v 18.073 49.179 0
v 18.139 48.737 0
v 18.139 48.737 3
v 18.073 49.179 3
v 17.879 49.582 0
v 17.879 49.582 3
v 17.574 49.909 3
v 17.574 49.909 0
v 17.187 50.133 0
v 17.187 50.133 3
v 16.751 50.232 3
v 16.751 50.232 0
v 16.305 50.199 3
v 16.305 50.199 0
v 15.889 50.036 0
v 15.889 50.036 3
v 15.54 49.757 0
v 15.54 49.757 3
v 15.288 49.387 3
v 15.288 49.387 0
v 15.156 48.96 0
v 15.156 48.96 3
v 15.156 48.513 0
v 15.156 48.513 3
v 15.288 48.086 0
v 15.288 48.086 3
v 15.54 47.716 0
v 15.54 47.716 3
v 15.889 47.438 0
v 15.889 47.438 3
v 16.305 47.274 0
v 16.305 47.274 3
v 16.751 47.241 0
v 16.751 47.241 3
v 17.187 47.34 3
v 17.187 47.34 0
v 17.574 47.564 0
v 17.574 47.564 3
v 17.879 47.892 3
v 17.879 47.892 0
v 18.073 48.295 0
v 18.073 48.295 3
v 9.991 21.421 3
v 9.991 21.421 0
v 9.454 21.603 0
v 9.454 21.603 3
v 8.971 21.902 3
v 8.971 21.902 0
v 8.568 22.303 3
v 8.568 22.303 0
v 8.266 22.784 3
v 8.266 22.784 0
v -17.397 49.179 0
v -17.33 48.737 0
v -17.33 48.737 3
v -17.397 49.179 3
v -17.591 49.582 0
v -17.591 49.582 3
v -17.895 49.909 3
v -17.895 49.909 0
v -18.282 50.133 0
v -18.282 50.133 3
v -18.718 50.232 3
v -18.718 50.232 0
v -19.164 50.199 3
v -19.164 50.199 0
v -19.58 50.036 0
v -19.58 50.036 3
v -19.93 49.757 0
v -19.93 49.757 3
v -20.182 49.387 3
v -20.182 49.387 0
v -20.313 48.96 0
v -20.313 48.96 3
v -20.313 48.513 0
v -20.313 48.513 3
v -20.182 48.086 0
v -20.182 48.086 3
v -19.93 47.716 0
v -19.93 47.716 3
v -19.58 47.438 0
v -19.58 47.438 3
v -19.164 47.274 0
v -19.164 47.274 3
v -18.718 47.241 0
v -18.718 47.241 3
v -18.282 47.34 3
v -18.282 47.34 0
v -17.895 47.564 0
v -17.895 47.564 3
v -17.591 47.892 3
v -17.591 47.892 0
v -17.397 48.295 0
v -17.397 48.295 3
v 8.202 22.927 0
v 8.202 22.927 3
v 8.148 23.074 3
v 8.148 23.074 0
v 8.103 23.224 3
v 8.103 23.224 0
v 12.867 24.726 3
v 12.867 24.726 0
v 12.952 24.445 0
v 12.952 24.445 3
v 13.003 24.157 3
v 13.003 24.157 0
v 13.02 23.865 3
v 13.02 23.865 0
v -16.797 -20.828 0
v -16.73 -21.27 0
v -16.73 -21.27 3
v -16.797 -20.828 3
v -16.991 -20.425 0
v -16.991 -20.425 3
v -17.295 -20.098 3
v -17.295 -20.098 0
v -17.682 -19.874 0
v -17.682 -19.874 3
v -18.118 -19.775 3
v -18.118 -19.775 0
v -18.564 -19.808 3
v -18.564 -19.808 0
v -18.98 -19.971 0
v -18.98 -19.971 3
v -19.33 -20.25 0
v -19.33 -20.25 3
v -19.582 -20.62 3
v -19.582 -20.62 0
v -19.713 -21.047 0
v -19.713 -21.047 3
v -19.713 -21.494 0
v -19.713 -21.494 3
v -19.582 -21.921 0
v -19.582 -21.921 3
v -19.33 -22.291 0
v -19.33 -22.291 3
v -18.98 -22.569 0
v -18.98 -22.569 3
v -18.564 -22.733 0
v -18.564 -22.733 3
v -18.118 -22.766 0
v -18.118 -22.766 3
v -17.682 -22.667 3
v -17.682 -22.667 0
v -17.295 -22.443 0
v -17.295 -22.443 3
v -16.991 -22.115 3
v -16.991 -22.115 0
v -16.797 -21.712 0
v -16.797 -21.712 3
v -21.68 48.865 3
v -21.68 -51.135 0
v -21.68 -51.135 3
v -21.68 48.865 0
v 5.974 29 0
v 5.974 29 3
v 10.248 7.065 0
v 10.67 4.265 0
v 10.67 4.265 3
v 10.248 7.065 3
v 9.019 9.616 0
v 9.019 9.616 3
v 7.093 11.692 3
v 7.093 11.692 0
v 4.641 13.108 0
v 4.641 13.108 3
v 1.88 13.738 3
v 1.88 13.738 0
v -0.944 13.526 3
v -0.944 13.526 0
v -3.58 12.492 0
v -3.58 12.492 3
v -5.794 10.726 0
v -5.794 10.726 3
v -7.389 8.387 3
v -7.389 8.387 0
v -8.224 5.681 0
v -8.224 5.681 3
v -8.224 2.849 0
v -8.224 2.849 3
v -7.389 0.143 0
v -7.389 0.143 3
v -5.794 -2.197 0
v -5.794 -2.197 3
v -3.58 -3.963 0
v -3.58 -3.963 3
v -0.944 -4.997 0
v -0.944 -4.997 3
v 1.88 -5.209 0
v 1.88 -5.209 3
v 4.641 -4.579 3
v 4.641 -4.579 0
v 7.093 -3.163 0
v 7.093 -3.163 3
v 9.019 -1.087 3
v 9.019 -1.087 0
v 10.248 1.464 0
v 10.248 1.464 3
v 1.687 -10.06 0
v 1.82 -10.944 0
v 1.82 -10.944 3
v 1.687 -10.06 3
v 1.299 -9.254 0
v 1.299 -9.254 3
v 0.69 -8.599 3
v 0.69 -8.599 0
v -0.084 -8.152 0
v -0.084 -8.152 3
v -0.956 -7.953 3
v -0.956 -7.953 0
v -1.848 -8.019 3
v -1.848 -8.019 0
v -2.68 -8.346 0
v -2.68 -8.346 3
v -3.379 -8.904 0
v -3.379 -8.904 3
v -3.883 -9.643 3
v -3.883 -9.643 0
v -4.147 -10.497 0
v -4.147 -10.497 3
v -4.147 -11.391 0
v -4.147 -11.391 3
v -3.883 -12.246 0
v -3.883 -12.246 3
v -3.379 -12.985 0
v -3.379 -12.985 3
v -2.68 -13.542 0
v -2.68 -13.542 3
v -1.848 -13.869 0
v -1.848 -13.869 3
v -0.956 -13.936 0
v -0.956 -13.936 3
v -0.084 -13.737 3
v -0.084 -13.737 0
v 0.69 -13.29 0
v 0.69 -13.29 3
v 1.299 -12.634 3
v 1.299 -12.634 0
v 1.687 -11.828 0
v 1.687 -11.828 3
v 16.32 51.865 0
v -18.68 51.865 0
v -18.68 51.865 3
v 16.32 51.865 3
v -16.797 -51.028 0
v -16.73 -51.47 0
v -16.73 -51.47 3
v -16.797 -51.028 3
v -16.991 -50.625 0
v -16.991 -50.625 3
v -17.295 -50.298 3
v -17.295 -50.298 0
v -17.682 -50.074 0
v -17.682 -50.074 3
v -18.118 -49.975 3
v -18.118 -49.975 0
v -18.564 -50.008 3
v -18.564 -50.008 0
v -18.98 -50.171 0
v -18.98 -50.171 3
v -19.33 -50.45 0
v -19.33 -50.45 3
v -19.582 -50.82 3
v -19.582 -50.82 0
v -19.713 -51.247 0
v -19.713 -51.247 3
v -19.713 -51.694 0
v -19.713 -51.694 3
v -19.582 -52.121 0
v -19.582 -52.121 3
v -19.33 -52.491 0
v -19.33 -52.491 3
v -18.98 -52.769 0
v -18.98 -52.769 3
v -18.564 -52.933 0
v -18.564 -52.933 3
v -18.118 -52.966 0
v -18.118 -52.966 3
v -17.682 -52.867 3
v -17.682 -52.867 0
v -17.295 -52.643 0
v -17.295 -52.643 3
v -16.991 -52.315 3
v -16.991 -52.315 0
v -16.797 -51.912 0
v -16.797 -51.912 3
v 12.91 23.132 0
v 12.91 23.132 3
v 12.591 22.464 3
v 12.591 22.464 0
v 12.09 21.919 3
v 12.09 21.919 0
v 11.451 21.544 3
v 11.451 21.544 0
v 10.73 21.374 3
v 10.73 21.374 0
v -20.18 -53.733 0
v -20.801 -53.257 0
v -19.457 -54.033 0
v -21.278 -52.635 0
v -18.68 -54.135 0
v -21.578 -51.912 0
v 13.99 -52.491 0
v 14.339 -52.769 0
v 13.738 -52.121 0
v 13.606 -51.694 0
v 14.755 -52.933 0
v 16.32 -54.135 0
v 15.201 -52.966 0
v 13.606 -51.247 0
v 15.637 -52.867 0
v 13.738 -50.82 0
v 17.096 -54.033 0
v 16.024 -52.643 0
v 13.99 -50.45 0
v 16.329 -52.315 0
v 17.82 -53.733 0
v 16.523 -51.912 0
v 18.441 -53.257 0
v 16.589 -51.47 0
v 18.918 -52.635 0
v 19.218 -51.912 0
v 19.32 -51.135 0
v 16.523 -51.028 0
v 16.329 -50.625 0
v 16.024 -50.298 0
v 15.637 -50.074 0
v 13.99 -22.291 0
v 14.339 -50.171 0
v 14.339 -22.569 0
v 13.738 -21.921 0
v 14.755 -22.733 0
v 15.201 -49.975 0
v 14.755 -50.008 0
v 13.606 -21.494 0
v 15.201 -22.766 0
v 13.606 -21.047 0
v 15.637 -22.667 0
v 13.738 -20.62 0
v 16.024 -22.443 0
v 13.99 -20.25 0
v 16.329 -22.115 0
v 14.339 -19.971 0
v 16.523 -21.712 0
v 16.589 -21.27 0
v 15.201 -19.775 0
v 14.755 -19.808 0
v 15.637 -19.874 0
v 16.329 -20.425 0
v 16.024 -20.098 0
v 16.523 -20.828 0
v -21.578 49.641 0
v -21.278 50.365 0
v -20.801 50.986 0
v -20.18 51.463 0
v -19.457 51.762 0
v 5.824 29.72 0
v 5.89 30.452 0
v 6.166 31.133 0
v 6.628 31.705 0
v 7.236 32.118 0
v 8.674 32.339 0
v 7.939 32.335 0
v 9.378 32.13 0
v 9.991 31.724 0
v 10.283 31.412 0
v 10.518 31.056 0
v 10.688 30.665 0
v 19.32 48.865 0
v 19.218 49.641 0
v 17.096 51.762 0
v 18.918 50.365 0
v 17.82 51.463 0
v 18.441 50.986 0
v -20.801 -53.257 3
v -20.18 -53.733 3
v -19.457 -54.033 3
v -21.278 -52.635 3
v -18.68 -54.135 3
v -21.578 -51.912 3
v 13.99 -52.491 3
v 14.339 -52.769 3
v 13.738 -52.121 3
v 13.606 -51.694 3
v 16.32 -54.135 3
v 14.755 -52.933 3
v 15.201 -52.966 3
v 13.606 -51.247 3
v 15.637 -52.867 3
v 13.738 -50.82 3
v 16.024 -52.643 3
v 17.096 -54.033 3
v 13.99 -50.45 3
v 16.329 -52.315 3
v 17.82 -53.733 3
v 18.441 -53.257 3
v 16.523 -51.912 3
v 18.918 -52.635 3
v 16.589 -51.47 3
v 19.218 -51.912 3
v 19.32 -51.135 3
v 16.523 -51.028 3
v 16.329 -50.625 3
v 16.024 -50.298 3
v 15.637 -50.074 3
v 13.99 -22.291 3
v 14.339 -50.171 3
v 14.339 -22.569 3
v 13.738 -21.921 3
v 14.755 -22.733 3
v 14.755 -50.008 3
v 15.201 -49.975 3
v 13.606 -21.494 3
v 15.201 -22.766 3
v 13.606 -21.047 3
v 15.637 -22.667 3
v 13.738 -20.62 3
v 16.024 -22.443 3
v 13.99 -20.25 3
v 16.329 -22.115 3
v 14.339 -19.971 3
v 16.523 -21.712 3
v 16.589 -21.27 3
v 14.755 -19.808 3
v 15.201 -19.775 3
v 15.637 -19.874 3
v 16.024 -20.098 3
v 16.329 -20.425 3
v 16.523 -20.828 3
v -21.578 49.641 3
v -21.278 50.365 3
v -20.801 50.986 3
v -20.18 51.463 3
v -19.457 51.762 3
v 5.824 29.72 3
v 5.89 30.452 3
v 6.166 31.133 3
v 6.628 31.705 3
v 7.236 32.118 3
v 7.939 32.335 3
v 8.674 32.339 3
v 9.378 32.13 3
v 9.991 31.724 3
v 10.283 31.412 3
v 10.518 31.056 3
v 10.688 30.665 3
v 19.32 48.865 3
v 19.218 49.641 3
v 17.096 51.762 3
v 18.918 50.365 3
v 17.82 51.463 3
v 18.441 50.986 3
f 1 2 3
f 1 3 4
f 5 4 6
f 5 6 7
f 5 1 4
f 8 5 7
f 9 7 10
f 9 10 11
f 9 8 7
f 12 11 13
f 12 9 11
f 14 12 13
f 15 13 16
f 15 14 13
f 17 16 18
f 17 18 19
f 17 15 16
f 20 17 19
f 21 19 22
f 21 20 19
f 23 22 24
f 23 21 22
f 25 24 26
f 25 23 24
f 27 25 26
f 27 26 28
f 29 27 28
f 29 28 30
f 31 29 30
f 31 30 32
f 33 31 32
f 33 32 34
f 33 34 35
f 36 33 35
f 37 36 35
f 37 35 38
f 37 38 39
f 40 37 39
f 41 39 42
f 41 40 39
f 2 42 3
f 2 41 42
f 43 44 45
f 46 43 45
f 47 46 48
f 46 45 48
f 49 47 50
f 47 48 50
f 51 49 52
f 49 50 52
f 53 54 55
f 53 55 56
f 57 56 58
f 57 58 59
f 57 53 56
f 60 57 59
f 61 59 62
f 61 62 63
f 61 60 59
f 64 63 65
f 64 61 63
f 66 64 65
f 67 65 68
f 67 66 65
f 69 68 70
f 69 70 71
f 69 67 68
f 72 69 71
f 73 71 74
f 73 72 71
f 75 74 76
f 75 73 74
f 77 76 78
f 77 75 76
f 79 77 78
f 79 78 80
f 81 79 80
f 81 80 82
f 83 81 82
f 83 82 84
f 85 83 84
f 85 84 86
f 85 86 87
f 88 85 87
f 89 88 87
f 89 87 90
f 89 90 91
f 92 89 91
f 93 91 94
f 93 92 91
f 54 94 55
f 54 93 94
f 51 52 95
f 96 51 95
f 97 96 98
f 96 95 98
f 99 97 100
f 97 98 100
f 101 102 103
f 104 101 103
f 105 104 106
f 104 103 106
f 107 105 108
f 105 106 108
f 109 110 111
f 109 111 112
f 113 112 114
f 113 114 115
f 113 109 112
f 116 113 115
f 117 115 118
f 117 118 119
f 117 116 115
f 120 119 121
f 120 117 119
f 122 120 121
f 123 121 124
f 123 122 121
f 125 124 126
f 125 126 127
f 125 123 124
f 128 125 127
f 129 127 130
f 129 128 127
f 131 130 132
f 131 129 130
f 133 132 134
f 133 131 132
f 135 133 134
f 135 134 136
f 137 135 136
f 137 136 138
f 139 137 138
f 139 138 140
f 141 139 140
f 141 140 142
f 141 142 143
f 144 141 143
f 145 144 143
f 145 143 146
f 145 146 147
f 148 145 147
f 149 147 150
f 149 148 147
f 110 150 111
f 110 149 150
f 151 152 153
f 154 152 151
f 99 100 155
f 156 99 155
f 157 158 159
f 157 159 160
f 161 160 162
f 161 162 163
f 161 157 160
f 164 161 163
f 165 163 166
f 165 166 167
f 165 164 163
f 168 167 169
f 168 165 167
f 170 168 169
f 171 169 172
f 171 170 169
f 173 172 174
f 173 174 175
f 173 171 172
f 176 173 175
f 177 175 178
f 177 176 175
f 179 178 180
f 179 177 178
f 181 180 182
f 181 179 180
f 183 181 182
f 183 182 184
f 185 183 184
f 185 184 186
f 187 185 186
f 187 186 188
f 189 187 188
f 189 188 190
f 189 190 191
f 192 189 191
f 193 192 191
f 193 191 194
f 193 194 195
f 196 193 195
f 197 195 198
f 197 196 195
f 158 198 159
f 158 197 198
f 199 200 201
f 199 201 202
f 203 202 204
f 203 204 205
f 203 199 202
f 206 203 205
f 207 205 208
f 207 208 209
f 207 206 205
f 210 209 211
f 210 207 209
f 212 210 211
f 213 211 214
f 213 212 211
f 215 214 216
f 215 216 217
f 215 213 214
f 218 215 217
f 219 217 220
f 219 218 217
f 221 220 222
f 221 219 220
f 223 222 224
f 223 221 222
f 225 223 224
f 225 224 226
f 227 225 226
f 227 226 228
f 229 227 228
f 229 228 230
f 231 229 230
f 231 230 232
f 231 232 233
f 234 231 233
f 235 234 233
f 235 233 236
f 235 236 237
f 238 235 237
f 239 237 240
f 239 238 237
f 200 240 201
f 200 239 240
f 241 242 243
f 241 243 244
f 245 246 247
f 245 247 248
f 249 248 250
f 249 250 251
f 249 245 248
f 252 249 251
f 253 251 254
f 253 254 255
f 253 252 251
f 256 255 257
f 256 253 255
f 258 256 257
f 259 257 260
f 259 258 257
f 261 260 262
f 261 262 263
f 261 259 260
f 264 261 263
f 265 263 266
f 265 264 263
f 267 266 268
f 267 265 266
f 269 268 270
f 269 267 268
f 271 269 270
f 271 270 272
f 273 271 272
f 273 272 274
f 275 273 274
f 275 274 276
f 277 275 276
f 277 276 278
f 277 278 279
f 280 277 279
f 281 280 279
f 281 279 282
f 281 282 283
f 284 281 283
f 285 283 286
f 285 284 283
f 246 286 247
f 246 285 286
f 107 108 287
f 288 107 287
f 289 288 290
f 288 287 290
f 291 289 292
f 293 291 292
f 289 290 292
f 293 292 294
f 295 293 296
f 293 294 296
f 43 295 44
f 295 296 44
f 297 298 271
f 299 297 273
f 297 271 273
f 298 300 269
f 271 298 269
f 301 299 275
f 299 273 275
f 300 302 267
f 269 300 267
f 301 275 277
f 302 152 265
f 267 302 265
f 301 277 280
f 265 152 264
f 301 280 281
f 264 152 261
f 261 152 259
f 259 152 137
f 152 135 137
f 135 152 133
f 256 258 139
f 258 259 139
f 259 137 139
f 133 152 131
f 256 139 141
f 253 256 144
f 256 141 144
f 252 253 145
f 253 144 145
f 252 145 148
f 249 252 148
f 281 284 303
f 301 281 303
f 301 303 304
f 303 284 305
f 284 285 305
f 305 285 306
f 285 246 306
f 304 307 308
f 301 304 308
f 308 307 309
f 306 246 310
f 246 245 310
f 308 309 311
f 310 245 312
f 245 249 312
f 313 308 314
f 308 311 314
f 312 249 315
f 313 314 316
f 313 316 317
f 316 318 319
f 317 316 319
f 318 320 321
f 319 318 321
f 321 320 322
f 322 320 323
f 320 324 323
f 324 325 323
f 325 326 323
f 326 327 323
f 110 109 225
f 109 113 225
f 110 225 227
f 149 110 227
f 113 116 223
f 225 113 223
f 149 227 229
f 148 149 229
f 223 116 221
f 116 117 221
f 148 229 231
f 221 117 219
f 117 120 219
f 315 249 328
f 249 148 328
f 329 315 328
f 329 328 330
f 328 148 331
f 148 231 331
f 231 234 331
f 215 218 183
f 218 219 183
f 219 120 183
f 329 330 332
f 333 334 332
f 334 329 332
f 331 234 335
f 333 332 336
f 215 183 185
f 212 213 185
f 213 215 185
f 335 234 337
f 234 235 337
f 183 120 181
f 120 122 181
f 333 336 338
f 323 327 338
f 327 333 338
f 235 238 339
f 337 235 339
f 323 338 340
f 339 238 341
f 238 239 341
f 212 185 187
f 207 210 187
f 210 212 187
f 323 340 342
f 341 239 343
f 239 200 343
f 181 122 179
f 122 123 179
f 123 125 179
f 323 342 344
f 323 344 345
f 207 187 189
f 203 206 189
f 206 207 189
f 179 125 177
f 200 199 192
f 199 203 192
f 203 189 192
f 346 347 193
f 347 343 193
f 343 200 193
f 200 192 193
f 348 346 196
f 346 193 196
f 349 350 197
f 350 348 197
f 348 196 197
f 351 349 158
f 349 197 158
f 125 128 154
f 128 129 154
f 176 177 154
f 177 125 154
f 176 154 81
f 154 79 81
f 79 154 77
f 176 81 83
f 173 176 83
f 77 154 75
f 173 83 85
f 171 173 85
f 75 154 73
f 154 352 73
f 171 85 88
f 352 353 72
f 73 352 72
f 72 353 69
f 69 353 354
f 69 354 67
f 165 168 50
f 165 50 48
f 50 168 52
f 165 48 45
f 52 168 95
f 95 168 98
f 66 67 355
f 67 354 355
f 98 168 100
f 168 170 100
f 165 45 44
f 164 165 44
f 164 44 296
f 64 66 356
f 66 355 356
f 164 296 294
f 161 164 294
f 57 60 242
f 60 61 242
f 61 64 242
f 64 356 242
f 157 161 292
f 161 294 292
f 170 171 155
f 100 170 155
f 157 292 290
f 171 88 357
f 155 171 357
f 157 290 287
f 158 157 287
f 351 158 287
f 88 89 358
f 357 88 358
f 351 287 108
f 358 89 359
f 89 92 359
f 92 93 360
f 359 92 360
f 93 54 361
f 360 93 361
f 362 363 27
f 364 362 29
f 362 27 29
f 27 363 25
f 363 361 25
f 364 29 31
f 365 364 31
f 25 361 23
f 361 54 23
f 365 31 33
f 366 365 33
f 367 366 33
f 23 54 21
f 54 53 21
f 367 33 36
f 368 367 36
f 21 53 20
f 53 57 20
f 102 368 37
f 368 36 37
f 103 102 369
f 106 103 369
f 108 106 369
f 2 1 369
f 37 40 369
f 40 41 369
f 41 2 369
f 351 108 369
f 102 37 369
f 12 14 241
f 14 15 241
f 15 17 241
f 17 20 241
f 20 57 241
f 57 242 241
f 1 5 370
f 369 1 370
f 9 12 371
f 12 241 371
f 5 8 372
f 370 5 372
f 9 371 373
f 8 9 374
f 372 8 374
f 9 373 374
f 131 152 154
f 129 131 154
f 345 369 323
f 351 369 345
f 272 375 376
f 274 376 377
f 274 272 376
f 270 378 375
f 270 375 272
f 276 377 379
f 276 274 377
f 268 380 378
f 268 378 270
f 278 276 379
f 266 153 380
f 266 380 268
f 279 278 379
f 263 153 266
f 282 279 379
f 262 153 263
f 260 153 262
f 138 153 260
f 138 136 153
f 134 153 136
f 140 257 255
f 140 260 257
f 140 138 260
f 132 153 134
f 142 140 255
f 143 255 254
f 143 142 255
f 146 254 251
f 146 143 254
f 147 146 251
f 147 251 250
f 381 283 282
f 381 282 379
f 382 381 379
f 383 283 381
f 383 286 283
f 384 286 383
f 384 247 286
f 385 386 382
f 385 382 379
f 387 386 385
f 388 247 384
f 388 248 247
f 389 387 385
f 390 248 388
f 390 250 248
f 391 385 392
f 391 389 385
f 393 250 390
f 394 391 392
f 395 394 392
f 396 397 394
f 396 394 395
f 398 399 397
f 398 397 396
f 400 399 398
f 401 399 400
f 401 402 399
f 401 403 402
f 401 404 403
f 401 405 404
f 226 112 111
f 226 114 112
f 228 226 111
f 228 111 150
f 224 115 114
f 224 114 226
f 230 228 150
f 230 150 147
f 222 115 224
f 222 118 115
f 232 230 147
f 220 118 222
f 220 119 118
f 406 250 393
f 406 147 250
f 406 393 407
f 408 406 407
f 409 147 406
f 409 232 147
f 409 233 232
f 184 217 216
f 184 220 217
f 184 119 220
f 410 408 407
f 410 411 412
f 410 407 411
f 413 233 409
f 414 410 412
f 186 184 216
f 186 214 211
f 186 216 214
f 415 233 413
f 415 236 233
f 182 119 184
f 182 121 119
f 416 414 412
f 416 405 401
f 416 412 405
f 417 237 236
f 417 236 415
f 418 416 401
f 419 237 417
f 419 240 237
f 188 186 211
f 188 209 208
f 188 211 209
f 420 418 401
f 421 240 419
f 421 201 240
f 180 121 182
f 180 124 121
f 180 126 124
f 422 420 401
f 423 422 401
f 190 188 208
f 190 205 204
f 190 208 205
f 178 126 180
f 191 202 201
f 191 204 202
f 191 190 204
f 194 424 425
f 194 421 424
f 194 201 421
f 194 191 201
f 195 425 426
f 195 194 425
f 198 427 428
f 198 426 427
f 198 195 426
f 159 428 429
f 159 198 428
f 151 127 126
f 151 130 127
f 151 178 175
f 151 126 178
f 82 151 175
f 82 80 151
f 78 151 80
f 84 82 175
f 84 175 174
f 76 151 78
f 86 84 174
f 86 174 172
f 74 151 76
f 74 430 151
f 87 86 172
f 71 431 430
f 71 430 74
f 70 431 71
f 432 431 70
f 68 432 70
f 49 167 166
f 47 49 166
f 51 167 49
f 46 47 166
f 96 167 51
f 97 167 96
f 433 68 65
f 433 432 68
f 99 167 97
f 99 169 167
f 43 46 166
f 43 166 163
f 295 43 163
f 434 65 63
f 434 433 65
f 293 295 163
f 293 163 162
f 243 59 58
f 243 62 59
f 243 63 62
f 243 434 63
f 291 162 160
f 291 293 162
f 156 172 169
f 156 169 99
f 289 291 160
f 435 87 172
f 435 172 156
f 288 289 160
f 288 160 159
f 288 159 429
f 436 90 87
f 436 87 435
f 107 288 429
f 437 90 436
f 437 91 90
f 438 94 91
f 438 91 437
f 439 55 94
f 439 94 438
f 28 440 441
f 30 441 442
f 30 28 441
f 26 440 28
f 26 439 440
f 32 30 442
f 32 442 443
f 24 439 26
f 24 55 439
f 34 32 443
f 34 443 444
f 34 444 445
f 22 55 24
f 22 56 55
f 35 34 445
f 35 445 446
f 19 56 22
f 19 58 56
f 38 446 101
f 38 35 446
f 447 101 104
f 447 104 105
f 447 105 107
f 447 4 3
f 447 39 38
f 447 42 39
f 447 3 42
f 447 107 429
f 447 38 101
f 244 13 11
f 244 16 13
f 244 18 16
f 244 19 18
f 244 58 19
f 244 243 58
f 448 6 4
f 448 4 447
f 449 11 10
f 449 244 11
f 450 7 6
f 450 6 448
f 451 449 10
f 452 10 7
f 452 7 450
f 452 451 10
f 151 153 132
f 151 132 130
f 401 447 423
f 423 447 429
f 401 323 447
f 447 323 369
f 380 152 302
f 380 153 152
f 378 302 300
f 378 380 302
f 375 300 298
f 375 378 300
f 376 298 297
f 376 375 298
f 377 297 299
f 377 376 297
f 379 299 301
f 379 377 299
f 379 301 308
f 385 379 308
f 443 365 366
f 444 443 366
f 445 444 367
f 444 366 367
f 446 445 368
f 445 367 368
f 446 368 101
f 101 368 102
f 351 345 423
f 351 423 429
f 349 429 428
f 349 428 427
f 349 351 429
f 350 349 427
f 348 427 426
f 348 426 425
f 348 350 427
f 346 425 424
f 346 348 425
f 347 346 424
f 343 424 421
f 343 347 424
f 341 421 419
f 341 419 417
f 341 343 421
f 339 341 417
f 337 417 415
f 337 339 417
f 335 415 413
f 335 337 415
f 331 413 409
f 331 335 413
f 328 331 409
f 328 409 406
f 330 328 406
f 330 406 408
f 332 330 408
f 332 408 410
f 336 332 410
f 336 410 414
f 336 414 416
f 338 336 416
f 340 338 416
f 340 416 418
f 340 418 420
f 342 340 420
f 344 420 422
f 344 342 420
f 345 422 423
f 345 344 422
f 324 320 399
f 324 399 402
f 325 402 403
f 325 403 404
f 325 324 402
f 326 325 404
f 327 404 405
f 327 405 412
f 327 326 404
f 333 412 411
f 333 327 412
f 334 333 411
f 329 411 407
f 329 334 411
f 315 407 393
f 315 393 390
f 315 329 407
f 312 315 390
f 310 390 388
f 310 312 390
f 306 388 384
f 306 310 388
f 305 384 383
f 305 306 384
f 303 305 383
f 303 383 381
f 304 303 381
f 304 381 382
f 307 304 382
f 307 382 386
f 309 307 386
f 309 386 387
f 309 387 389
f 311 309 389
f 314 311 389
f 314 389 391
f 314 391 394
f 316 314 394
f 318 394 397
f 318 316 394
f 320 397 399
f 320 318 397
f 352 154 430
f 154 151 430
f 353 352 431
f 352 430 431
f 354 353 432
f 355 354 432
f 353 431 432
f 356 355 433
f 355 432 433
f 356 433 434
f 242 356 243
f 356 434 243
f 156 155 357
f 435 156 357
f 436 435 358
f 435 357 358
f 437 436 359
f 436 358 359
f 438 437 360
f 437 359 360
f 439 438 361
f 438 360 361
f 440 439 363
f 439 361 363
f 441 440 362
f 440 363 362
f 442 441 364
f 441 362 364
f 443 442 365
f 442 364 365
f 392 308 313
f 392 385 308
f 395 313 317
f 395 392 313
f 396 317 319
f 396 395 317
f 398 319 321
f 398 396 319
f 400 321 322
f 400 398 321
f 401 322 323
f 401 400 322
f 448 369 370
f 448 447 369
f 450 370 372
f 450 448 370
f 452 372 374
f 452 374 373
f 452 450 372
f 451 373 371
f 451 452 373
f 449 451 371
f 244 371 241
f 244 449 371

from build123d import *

# Parameters (mm, degrees)
F0_W     = 41
F0_H     = 106
F0_R     = 1.5
F0_R_2   = 5.05
F0_R_3   = 2
F0_R_4   = 3
F0_R_5   = 9.5
F1_DEPTH = 3
F2_R     = 3


# Not quite as in the source:
# - a feature names something its author has since deleted; it is built from what else it names


with BuildPart() as f1:
    # F0 (on Top) → F1 (new body)
    with BuildSketch(Plane.XY):
        with Locations((-1.1801278293, -1.1353523731)):
            Rectangle(F0_W, F0_H)
        with Locations((-18.2301278293, -51.4703523731)):
            Circle(F0_R, mode=Mode.SUBTRACT)
        with Locations((-6.776117335, -33.481924504)):
            Circle(F0_R_2, mode=Mode.SUBTRACT)
        with Locations((-18.2301278293, -21.2703523731)):
            Circle(F0_R, mode=Mode.SUBTRACT)
        with Locations((-11.8353097141, -18.4490393624)):
            Circle(F0_R_3, mode=Mode.SUBTRACT)
        with BuildLine():
            ThreePointArc((0.9913514778, -28.481924504), (-4.9415118708, -25.855220261), (-8.0481067447, -20.1589485871))
            Line((-8.0481067447, -20.1589485871), (9.9913514778, -20.516399593))
            Line((9.9913514778, -20.516399593), (9.9913514778, -46.516399593))
            Line((9.9913514778, -46.516399593), (-8.0481067447, -46.804900421))
            ThreePointArc((-8.0481067447, -46.804900421), (-4.9415118708, -41.1086287471), (0.9913514778, -38.481924504))
            Line((0.9913514778, -38.481924504), (0.9913514778, -28.481924504))
        make_face(mode=Mode.SUBTRACT)
        with Locations((15.0892422113, -51.4703523731)):
            Circle(F0_R, mode=Mode.SUBTRACT)
        with Locations((-1.1801278293, -10.9442314133)):
            Circle(F0_R_4, mode=Mode.SUBTRACT)
        with Locations((15.0892422113, -21.2703523731)):
            Circle(F0_R, mode=Mode.SUBTRACT)
        with Locations((-11.8353097141, -0.1353523731)):
            Circle(F0_R_3, mode=Mode.SUBTRACT)
        with Locations((-11.8353097141, 18.1783346161)):
            Circle(F0_R_3, mode=Mode.SUBTRACT)
        with Locations((-18.8301271707, 48.7366476269)):
            Circle(F0_R, mode=Mode.SUBTRACT)
        with Locations((-6.776117335, 33.2112197578)):
            Circle(F0_R_2, mode=Mode.SUBTRACT)
        with Locations((1.1698721707, 4.2646476269)):
            Circle(F0_R_5, mode=Mode.SUBTRACT)
        with BuildLine():
            ThreePointArc((0.9913514778, 38.2112197578), (-4.9415118708, 40.8379240009), (-8.0481067447, 46.5341956747))
            Line((-8.0481067447, 46.5341956747), (9.9913514778, 46.2456948468))
            Line((9.9913514778, 46.2456948468), (9.9913514778, 31.7237218389))
            ThreePointArc((9.9913514778, 31.7237218389), (10.4081379557, 31.2391097076), (10.6884153726, 30.6646495649))
            Line((10.6884153726, 30.6646495649), (12.8669505005, 24.7255908967))
            ThreePointArc((12.8669505005, 24.7255908967), (12.9813448828, 24.3018570593), (13.0198721707, 23.8646476269))
            ThreePointArc((13.0198721707, 23.8646476269), (12.0896967258, 21.9189727141), (9.9913514778, 21.4211530234))
            Line((9.9913514778, 21.4211530234), (9.9913514778, 20.2456948468))
            Line((9.9913514778, 20.2456948468), (-8.0481067447, 19.8882438409))
            ThreePointArc((-8.0481067447, 19.8882438409), (-4.9415118708, 25.5845155147), (0.9913514778, 28.2112197578))
            Line((0.9913514778, 28.2112197578), (0.9913514778, 38.2112197578))
        make_face(mode=Mode.SUBTRACT)
        with Locations((16.6392421771, 48.7366476269)):
            Circle(F0_R, mode=Mode.SUBTRACT)
        with BuildLine():
            Line((9.9913514778, -20.516399593), (-8.0481067447, -20.1589485871))
            ThreePointArc((-8.0481067447, -20.1589485871), (-4.9415118708, -25.855220261), (0.9913514778, -28.481924504))
            Line((0.9913514778, -28.481924504), (0.9913514778, -38.481924504))
            ThreePointArc((0.9913514778, -38.481924504), (-4.9415118708, -41.1086287471), (-8.0481067447, -46.804900421))
            Line((-8.0481067447, -46.804900421), (9.9913514778, -46.516399593))
            Line((9.9913514778, -46.516399593), (9.9913514778, -20.516399593))
        make_face()
        with Locations((-2.2937730764, -41.981924504)):
            Circle(F0_R, mode=Mode.SUBTRACT)
        with Locations((-2.2937730764, -24.981924504)):
            Circle(F0_R, mode=Mode.SUBTRACT)
        with BuildLine():
            Line((9.9913514778, 46.2456948468), (-8.0481067447, 46.5341956747))
            ThreePointArc((-8.0481067447, 46.5341956747), (-4.9415118708, 40.8379240009), (0.9913514778, 38.2112197578))
            Line((0.9913514778, 38.2112197578), (0.9913514778, 28.2112197578))
            ThreePointArc((0.9913514778, 28.2112197578), (-4.9415118708, 25.5845155147), (-8.0481067447, 19.8882438409))
            Line((-8.0481067447, 19.8882438409), (9.9913514778, 20.2456948468))
            Line((9.9913514778, 20.2456948468), (9.9913514778, 21.4211530234))
            ThreePointArc((9.9913514778, 21.4211530234), (8.9707387909, 21.9024586015), (8.2657292668, 22.7835186943))
            ThreePointArc((8.2657292668, 22.7835186943), (8.1741724057, 22.9999554201), (8.1033430916, 23.2240329142))
            Line((8.1033430916, 23.2240329142), (5.9741724057, 28.9999554201))
            ThreePointArc((5.9741724057, 28.9999554201), (6.9168863609, 31.9338578186), (9.9913514778, 31.7237218389))
            Line((9.9913514778, 31.7237218389), (9.9913514778, 46.2456948468))
        make_face()
        with Locations((-2.2937730764, 24.7112197578)):
            Circle(F0_R, mode=Mode.SUBTRACT)
        with Locations((-2.2937730764, 41.7112197578)):
            Circle(F0_R, mode=Mode.SUBTRACT)
        with Locations((-6.776117335, 33.2112197578)):
            Circle(F0_R_2)
        with Locations((-6.776117335, -33.481924504)):
            Circle(F0_R_2)
        with Locations((-11.8353097141, -18.4490393624)):
            Circle(F0_R_3)
        with Locations((-11.8353097141, -0.1353523731)):
            Circle(F0_R_3)
        with Locations((-11.8353097141, 18.1783346161)):
            Circle(F0_R_3)
        with Locations((-2.2937730764, -24.981924504)):
            Circle(F0_R)
        with Locations((-2.2937730764, -41.981924504)):
            Circle(F0_R)
        with Locations((-2.2937730764, 24.7112197578)):
            Circle(F0_R)
        with Locations((-2.2937730764, 41.7112197578)):
            Circle(F0_R)
    extrude(amount=F1_DEPTH)

    # F2
    f2_edges = [f1.edges().sort_by_distance(p)[0] for p in [
        (-21.680128, 51.864648, 1.5),
        (-21.680128, -54.135352, 1.5),
        (19.319872, -54.135352, 1.5),
        (19.319872, 51.864648, 1.5),
    ]]
    fillet(f2_edges, radius=F2_R)


solid = f1.part
